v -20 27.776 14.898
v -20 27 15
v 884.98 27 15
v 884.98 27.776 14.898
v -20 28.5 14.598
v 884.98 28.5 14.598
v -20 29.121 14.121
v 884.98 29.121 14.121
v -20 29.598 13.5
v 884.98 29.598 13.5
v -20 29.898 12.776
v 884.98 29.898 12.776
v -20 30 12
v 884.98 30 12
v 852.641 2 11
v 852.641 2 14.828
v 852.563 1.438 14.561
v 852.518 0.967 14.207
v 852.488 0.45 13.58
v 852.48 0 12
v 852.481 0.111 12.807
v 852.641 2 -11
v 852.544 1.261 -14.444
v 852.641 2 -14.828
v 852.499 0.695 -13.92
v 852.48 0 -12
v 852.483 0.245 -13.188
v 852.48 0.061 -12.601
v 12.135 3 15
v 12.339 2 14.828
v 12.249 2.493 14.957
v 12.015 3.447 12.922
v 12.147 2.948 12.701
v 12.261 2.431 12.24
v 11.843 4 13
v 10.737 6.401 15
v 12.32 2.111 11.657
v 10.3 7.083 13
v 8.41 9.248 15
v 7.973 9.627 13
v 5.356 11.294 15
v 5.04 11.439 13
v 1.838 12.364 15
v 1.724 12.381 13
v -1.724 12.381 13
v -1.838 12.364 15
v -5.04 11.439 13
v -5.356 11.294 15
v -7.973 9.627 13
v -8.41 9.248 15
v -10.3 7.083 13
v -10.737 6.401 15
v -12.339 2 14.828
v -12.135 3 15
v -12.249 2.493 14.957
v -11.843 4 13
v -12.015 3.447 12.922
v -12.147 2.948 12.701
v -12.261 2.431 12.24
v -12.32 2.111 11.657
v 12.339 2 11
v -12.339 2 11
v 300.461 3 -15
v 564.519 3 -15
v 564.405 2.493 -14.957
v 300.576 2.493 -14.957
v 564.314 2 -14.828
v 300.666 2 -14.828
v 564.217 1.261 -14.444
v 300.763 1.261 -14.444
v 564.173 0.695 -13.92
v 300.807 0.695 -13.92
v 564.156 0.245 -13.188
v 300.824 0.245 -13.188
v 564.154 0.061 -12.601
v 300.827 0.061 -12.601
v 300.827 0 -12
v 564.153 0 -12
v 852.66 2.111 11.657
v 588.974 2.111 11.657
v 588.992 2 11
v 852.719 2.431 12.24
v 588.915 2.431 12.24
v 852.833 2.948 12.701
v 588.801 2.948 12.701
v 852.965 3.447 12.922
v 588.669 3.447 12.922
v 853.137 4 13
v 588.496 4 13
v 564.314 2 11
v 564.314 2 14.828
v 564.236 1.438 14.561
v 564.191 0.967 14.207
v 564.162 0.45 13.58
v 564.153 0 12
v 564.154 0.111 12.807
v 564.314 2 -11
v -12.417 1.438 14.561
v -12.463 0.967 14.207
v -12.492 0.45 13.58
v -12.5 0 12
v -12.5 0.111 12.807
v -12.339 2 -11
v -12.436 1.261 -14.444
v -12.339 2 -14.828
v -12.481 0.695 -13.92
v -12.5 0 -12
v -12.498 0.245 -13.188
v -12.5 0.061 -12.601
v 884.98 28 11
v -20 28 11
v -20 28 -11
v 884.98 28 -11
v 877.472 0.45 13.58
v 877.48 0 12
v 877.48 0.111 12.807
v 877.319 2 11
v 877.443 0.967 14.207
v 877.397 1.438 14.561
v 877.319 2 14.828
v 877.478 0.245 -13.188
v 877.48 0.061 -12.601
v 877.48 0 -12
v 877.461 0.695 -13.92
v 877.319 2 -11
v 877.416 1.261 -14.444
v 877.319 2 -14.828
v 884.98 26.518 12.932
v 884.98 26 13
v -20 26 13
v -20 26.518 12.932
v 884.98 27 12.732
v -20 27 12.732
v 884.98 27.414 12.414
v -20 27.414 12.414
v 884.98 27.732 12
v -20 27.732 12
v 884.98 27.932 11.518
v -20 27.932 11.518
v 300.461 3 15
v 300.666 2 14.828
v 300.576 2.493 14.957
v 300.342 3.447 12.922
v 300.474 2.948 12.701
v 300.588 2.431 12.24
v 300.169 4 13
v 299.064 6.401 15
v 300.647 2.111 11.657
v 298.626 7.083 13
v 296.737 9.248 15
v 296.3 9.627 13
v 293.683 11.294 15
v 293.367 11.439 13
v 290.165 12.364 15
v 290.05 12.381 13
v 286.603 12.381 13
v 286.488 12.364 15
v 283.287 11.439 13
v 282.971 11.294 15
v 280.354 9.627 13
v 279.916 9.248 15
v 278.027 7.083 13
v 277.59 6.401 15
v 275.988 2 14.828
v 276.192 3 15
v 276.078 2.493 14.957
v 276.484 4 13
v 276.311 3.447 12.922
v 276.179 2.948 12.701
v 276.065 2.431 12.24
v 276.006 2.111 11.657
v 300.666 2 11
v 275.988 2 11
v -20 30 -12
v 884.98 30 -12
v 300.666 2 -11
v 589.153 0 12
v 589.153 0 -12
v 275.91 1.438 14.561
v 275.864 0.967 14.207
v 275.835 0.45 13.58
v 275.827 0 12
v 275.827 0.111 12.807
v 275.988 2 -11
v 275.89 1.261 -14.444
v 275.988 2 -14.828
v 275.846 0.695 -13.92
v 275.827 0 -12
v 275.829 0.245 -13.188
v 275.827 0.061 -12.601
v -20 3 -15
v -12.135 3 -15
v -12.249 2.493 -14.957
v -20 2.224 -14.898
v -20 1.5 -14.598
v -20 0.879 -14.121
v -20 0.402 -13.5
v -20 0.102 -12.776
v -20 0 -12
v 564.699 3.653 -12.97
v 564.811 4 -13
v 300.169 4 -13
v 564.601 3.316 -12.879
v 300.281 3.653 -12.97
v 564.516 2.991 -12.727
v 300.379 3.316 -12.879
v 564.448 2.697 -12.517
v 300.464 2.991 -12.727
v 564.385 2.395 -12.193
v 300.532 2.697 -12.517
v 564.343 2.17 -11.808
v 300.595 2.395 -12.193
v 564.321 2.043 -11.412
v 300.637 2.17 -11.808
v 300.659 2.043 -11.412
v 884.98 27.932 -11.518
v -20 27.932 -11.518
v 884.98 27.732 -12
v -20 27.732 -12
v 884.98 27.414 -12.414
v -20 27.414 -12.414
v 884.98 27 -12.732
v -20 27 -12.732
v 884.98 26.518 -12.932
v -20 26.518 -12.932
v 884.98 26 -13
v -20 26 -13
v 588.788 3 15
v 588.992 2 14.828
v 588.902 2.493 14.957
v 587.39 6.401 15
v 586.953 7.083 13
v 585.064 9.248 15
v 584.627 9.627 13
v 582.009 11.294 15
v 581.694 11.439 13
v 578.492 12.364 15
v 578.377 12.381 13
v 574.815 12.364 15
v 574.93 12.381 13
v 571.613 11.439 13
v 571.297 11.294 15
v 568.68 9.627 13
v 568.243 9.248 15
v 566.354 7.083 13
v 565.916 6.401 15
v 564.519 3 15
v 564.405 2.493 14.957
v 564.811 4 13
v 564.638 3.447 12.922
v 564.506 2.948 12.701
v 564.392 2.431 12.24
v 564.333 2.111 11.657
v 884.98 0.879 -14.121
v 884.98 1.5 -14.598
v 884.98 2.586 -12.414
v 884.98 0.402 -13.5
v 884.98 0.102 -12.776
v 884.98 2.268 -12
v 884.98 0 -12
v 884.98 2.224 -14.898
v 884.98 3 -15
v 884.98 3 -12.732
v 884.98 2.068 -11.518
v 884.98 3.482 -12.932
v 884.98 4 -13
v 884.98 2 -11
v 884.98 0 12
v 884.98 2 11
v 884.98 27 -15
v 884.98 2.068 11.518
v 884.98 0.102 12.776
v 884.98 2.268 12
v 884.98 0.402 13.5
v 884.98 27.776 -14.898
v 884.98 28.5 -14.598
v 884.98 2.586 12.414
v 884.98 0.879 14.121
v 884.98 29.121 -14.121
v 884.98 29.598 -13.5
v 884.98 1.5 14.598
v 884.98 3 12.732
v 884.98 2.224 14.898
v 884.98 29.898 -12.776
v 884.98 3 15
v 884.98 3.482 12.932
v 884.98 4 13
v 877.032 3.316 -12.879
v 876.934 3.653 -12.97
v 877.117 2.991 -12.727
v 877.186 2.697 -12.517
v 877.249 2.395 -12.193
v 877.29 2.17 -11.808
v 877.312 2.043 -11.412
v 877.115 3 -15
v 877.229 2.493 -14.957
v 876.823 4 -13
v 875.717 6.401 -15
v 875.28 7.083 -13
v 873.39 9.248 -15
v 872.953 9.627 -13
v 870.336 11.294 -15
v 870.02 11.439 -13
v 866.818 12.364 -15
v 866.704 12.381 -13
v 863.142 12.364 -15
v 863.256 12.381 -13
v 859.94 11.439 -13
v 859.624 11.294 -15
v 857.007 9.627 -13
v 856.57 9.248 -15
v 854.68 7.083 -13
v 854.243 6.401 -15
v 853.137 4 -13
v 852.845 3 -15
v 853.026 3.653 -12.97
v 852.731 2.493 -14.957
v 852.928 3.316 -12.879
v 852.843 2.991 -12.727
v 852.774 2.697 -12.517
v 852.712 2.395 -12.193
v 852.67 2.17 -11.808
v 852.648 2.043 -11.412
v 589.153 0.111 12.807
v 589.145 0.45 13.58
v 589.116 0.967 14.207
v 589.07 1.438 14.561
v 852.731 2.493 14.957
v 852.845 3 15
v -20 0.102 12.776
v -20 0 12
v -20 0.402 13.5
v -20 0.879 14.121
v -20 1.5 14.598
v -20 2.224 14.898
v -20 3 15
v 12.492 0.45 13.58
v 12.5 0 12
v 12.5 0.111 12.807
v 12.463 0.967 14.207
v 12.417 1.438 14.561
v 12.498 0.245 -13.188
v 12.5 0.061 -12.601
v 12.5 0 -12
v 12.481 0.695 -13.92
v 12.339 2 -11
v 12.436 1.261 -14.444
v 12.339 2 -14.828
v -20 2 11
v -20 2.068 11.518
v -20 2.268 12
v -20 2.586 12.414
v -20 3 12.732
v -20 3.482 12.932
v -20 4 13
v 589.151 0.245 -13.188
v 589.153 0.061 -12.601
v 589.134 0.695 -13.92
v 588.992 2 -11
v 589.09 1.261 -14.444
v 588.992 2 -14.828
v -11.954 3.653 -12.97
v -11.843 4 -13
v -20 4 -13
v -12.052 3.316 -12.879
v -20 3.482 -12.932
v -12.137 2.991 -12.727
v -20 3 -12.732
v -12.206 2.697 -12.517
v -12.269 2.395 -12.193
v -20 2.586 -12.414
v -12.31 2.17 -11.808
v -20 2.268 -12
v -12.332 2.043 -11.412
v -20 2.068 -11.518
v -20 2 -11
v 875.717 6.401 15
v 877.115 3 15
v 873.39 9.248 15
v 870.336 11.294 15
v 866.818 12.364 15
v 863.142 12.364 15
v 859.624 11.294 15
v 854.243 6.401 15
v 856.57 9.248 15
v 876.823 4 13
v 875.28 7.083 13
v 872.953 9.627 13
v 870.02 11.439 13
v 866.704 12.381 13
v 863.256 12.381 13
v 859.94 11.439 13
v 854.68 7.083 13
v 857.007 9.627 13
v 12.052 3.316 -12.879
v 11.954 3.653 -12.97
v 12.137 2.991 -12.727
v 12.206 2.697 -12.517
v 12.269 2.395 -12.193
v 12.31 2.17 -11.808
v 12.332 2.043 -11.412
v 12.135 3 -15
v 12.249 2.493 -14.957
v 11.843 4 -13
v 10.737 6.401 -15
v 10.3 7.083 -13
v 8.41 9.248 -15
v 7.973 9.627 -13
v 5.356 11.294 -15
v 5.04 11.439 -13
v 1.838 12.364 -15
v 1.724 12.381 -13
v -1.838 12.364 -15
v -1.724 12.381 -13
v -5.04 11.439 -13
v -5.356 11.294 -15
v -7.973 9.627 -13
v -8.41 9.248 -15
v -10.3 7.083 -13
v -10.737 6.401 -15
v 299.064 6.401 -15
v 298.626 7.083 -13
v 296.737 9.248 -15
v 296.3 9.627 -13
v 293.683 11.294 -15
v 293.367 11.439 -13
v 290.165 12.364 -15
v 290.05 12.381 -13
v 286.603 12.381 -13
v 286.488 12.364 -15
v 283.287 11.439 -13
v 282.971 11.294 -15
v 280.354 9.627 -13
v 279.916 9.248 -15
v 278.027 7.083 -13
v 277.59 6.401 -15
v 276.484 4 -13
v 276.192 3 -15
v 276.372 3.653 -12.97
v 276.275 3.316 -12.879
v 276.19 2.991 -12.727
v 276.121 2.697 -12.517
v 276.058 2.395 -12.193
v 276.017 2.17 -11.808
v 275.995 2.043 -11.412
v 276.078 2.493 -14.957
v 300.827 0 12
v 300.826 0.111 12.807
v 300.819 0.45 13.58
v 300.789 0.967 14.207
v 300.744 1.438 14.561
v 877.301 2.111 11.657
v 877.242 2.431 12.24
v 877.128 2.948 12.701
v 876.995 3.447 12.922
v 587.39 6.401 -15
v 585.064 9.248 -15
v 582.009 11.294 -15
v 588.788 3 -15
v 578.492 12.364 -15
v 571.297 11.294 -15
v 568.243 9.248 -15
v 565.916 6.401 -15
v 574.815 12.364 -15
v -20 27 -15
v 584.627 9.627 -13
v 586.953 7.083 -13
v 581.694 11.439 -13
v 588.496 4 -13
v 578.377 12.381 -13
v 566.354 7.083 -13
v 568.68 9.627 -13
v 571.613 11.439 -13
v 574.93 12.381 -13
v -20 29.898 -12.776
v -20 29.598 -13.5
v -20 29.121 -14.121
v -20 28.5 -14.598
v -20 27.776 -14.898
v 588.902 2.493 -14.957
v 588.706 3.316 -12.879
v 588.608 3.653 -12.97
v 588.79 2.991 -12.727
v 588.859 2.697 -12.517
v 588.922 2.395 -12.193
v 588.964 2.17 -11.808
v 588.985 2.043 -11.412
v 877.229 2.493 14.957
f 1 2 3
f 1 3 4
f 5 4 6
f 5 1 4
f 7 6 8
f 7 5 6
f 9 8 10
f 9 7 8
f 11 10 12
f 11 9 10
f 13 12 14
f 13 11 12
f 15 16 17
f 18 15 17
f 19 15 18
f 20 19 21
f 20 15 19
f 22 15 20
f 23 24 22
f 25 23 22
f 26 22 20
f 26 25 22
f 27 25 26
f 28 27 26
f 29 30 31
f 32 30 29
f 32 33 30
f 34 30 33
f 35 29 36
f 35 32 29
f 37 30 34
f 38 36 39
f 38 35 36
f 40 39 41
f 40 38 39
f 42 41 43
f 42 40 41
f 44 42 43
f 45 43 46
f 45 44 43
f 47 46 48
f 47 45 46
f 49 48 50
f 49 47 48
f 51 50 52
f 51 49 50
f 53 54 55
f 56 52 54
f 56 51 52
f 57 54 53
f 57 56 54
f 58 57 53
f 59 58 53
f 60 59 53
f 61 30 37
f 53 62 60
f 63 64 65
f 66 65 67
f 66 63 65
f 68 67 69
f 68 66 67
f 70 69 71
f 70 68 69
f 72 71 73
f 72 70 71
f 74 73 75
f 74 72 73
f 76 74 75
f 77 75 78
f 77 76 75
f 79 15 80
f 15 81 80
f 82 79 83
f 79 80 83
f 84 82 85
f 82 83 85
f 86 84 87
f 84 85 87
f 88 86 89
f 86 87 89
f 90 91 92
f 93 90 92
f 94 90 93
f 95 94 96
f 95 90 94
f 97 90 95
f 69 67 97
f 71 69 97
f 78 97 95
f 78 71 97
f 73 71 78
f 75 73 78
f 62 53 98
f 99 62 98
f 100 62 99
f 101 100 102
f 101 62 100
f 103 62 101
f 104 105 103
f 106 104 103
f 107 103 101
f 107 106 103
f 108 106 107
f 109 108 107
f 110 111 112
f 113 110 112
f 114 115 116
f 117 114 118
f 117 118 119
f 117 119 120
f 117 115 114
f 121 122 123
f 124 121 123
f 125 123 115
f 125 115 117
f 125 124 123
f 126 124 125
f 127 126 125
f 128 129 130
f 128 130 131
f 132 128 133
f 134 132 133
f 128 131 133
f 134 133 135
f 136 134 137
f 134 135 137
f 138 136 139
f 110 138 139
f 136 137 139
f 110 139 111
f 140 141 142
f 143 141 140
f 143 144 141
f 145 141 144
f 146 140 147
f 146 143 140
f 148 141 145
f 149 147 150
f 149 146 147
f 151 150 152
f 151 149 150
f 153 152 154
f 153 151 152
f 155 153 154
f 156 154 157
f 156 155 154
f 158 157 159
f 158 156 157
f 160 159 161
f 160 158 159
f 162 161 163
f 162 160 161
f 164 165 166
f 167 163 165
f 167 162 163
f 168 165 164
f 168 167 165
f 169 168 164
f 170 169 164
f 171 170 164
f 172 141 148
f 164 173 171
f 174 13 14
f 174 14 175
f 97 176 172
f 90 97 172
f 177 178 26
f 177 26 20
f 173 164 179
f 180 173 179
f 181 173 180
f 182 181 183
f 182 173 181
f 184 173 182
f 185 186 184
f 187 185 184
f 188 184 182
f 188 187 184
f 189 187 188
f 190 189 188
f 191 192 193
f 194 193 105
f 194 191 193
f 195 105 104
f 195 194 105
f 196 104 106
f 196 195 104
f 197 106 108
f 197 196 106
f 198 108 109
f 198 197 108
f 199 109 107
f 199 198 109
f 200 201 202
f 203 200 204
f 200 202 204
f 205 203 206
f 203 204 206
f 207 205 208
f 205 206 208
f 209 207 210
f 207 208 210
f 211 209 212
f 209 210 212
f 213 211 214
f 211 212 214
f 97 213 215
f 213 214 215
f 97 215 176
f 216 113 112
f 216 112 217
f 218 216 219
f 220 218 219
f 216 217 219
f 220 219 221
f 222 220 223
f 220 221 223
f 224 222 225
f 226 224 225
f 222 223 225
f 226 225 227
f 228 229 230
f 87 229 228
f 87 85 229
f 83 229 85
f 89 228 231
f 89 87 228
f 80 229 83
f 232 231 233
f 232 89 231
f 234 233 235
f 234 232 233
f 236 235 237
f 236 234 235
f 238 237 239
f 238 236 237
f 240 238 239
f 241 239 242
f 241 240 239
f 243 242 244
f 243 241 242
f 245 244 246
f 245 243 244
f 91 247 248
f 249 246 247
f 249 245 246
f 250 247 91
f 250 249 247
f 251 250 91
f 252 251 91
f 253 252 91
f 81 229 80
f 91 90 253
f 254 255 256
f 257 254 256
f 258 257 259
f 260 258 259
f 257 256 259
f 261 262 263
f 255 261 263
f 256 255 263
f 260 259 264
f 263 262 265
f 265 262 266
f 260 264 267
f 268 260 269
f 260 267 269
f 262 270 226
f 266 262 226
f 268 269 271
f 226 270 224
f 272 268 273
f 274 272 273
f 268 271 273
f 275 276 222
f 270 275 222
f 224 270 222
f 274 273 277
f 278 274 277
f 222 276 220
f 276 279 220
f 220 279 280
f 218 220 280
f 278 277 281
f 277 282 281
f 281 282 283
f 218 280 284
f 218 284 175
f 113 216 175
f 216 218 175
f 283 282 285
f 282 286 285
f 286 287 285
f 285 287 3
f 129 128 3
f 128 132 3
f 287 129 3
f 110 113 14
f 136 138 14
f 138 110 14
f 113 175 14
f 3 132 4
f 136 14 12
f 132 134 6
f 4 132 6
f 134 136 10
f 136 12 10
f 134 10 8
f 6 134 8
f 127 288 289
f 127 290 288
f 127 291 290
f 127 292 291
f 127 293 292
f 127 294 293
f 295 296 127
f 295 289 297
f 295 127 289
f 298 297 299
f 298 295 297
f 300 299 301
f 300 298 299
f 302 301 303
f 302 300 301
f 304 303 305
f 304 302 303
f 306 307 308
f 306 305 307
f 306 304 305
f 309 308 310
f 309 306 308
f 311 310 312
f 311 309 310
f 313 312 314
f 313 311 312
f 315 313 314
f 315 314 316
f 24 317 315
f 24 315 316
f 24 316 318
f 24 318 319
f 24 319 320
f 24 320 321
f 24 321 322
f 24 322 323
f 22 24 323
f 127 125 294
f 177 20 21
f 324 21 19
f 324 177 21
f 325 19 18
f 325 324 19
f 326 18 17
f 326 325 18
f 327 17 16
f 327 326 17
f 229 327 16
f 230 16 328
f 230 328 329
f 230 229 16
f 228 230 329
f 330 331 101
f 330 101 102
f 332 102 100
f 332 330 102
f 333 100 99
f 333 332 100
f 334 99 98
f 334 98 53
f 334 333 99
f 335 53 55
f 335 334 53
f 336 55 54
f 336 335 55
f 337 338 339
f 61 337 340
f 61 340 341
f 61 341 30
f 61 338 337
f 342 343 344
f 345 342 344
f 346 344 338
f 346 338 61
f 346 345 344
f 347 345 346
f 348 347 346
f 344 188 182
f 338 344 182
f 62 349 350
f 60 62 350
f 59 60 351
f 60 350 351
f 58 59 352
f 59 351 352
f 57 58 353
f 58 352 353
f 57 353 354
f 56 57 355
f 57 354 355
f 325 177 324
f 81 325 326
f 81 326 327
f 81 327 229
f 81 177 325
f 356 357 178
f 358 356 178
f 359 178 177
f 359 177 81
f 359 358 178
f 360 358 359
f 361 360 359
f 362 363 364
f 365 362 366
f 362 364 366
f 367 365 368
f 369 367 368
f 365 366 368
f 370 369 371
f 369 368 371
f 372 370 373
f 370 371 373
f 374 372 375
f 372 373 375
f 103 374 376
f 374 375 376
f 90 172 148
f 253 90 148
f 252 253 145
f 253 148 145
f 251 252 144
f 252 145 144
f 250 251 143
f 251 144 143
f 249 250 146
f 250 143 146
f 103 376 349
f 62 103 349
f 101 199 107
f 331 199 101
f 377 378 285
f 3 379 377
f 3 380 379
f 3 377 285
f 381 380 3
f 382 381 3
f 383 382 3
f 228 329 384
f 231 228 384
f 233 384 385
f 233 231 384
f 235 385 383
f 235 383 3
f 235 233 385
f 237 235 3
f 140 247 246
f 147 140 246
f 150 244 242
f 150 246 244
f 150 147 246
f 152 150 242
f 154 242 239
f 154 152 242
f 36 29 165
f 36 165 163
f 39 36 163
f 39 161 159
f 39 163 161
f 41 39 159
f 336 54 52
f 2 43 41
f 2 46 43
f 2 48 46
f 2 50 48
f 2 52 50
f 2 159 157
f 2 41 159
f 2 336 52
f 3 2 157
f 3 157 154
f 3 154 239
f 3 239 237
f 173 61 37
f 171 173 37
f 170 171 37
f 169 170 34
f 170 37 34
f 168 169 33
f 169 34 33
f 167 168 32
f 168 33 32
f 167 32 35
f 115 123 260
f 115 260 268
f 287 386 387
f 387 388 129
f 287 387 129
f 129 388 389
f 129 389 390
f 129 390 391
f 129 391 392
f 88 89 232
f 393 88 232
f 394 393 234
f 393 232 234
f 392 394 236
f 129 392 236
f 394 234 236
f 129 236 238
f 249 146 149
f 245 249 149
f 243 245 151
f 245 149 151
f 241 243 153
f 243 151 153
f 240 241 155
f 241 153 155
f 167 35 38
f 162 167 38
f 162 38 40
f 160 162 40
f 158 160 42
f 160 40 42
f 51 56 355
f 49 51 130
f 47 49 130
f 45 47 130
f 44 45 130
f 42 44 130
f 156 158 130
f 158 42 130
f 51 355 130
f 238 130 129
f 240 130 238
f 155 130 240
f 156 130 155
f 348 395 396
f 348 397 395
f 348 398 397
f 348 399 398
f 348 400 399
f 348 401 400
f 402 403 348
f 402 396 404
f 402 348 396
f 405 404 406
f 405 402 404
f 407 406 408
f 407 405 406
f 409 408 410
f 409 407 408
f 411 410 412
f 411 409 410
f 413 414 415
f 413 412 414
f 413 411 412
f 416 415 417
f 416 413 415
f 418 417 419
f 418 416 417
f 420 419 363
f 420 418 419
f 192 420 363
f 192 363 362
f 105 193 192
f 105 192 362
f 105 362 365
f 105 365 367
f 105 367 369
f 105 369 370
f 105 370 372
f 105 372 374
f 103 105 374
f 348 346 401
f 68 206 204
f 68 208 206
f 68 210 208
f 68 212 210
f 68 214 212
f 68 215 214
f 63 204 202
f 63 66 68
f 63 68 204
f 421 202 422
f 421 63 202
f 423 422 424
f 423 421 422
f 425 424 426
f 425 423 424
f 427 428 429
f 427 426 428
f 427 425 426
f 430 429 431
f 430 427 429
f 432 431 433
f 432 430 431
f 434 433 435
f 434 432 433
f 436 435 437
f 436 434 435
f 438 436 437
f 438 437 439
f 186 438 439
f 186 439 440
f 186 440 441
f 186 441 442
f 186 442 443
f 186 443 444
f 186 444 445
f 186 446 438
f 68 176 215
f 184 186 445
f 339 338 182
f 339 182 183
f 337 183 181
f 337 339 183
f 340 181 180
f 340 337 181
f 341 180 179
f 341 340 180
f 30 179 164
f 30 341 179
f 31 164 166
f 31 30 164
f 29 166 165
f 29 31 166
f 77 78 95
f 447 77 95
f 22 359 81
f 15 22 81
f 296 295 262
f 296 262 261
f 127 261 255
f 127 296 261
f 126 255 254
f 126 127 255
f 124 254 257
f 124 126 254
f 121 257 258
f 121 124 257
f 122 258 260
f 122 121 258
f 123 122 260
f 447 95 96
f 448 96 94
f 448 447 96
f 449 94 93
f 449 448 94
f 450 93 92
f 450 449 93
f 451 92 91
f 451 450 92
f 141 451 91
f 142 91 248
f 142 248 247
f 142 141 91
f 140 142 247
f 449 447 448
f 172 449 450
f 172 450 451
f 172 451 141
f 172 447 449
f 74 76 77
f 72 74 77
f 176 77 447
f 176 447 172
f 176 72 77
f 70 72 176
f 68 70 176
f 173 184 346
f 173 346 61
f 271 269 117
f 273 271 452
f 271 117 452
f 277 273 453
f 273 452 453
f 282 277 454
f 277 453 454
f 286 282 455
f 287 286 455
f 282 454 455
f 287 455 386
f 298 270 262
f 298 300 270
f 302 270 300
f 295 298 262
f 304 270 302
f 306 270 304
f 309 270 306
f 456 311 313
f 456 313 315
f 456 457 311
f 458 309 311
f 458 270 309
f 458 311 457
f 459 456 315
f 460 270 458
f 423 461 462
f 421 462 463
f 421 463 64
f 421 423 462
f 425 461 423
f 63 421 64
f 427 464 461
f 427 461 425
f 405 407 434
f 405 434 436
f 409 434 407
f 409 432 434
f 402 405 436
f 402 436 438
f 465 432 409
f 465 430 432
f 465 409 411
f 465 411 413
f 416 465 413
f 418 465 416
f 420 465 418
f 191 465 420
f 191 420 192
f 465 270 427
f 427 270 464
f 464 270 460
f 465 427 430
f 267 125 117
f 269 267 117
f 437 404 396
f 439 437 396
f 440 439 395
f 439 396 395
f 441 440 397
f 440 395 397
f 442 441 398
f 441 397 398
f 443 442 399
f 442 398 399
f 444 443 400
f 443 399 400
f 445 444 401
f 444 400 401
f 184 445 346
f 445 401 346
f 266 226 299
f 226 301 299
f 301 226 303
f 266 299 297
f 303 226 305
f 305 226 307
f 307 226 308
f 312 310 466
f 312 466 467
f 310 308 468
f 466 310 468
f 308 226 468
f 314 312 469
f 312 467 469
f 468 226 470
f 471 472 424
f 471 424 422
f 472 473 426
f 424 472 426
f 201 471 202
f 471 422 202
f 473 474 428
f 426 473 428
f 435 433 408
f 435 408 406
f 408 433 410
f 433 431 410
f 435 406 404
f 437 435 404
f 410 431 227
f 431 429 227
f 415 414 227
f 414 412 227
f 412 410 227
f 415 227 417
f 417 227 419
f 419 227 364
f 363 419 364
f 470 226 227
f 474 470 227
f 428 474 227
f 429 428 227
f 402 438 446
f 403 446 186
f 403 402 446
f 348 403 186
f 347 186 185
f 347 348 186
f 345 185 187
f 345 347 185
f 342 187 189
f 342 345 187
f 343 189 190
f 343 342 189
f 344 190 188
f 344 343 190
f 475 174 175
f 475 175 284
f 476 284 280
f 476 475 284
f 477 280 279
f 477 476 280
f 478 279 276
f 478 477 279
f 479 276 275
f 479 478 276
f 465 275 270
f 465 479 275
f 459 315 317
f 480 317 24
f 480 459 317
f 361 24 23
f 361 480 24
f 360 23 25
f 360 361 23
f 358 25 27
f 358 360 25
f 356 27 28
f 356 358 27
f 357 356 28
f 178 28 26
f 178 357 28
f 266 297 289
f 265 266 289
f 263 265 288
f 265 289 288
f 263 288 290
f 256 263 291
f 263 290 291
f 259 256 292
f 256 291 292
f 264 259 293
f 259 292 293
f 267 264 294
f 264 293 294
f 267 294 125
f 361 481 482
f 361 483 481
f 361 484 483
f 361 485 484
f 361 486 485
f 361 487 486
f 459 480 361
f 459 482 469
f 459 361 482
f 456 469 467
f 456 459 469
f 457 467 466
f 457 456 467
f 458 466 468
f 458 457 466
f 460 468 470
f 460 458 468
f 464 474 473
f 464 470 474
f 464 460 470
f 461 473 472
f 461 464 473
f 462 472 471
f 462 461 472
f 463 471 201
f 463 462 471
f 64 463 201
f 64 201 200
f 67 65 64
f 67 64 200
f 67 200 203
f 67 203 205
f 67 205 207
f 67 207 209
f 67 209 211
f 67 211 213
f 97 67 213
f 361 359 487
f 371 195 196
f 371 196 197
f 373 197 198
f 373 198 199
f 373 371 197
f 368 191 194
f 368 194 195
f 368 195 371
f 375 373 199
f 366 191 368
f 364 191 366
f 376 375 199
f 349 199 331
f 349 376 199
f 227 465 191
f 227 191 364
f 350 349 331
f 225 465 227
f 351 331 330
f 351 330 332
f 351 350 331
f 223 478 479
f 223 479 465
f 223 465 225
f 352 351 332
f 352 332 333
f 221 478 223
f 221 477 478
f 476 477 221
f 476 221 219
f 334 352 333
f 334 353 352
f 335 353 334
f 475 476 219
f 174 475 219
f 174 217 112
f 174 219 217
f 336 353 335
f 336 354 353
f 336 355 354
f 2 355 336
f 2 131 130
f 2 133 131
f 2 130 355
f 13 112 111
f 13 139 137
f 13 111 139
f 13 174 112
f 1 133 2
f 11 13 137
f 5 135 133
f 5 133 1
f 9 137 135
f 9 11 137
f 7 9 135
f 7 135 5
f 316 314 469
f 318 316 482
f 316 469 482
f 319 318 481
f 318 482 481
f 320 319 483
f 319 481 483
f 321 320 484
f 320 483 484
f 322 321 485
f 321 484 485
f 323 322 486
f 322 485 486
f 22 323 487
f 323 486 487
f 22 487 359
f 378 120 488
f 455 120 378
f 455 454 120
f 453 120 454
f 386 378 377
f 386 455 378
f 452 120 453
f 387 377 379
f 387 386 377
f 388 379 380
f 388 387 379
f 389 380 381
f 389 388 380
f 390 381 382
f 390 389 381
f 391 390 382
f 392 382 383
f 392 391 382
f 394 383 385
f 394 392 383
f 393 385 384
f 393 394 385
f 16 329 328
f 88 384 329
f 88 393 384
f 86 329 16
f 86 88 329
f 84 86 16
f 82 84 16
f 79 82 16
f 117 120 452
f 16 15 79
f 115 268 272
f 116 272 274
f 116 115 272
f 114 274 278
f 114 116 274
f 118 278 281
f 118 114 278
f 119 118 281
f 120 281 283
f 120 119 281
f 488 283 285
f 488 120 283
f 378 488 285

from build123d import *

# Parameters (mm, degrees)
EXTRUDE_1_DEPTH      = 884.980118
EXTRUDE_1_DEPTH_BACK = 20
OTHER_START          = -15
OTHER_2_DEPTH        = 30


# Read off the part's stored shape, not the designer's step: Полость2
with BuildPart() as part:
    # Эскиз1 → Бобышка-Вытянуть1 (new, two sides: drawn at the far end of the back side and taken through both)
    with BuildSketch(Plane(origin=(0, 0, 0), x_dir=(0, 0, -1), z_dir=(1, 0, 0)).offset(-EXTRUDE_1_DEPTH_BACK)):
        with BuildLine():
            Line((-12, 30), (12, 30))
            ThreePointArc((12, 30), (14.121320344, 29.121320344), (15, 27))
            Line((15, 27), (15, 3))
            ThreePointArc((15, 3), (14.121320344, 0.878679656), (12, 0))
            Line((12, 0), (-12, 0))
            ThreePointArc((-12, 0), (-14.121320344, 0.878679656), (-15, 3))
            Line((-15, 3), (-15, 27))
            ThreePointArc((-15, 27), (-14.121320344, 29.121320344), (-12, 30))
        make_face()
        with BuildLine():
            Line((-11, 28), (11, 28))
            ThreePointArc((11, 28), (12.414213562, 27.414213562), (13, 26))
            Line((13, 26), (13, 4))
            ThreePointArc((13, 4), (12.414213562, 2.585786438), (11, 2))
            Line((11, 2), (-11, 2))
            ThreePointArc((-11, 2), (-12.414213562, 2.585786438), (-13, 4))
            Line((-13, 4), (-13, 26))
            ThreePointArc((-13, 26), (-12.414213562, 27.414213562), (-11, 28))
        make_face(mode=Mode.SUBTRACT)
    extrude(amount=EXTRUDE_1_DEPTH + EXTRUDE_1_DEPTH_BACK)

    # Полость2 outline → Полость2 (cut)
    with BuildSketch(Plane.XY.offset(OTHER_START)):
        with BuildLine():
            Line((852.480118087, -4.981e-06), (877.480118087, -4.981e-06))
            ThreePointArc((877.480118087, -4.981e-06), (877.439793915, 1.003233908), (877.319080766, 2))
            Line((877.319080766, 2), (852.641155408, 2))
            ThreePointArc((852.641155408, 2), (852.52044226, 1.003233908), (852.480118087, -4.981e-06))
        make_face()
        with BuildLine():
            Line((852.641155408, 2), (877.319080766, 2))
            ThreePointArc((877.319080766, 2), (864.980118087, 12.5), (852.641155408, 2))
        make_face()
        with BuildLine():
            Line((564.153412058, -4.981e-06), (589.153412058, -4.981e-06))
            ThreePointArc((589.153412058, -4.981e-06), (589.113087885, 1.003233908), (588.992374737, 2))
            Line((588.992374737, 2), (564.314449379, 2))
            ThreePointArc((564.314449379, 2), (564.193736231, 1.003233908), (564.153412058, -4.981e-06))
        make_face()
        with BuildLine():
            Line((564.314449379, 2), (588.992374737, 2))
            ThreePointArc((588.992374737, 2), (576.653412058, 12.5), (564.314449379, 2))
        make_face()
        with BuildLine():
            Line((275.826706029, -4.981e-06), (300.826706029, -4.981e-06))
            ThreePointArc((300.826706029, -4.981e-06), (300.786381856, 1.003233908), (300.665668708, 2))
            Line((300.665668708, 2), (275.98774335, 2))
            ThreePointArc((275.98774335, 2), (275.867030202, 1.003233908), (275.826706029, -4.981e-06))
        make_face()
        with BuildLine():
            Line((275.98774335, 2), (300.665668708, 2))
            ThreePointArc((300.665668708, 2), (288.326706029, 12.5), (275.98774335, 2))
        make_face()
        with BuildLine():
            Line((-12.5, -4.981e-06), (12.5, -4.981e-06))
            ThreePointArc((12.5, -4.981e-06), (12.459675827, 1.003233908), (12.338962679, 2))
            Line((12.338962679, 2), (-12.338962679, 2))
            ThreePointArc((-12.338962679, 2), (-12.459675827, 1.003233908), (-12.5, -4.981e-06))
        make_face()
        with BuildLine():
            Line((-12.338962679, 2), (12.338962679, 2))
            ThreePointArc((12.338962679, 2), (0, 12.5), (-12.338962679, 2))
        make_face()
    extrude(amount=OTHER_2_DEPTH, mode=Mode.SUBTRACT)


solid = part.part
